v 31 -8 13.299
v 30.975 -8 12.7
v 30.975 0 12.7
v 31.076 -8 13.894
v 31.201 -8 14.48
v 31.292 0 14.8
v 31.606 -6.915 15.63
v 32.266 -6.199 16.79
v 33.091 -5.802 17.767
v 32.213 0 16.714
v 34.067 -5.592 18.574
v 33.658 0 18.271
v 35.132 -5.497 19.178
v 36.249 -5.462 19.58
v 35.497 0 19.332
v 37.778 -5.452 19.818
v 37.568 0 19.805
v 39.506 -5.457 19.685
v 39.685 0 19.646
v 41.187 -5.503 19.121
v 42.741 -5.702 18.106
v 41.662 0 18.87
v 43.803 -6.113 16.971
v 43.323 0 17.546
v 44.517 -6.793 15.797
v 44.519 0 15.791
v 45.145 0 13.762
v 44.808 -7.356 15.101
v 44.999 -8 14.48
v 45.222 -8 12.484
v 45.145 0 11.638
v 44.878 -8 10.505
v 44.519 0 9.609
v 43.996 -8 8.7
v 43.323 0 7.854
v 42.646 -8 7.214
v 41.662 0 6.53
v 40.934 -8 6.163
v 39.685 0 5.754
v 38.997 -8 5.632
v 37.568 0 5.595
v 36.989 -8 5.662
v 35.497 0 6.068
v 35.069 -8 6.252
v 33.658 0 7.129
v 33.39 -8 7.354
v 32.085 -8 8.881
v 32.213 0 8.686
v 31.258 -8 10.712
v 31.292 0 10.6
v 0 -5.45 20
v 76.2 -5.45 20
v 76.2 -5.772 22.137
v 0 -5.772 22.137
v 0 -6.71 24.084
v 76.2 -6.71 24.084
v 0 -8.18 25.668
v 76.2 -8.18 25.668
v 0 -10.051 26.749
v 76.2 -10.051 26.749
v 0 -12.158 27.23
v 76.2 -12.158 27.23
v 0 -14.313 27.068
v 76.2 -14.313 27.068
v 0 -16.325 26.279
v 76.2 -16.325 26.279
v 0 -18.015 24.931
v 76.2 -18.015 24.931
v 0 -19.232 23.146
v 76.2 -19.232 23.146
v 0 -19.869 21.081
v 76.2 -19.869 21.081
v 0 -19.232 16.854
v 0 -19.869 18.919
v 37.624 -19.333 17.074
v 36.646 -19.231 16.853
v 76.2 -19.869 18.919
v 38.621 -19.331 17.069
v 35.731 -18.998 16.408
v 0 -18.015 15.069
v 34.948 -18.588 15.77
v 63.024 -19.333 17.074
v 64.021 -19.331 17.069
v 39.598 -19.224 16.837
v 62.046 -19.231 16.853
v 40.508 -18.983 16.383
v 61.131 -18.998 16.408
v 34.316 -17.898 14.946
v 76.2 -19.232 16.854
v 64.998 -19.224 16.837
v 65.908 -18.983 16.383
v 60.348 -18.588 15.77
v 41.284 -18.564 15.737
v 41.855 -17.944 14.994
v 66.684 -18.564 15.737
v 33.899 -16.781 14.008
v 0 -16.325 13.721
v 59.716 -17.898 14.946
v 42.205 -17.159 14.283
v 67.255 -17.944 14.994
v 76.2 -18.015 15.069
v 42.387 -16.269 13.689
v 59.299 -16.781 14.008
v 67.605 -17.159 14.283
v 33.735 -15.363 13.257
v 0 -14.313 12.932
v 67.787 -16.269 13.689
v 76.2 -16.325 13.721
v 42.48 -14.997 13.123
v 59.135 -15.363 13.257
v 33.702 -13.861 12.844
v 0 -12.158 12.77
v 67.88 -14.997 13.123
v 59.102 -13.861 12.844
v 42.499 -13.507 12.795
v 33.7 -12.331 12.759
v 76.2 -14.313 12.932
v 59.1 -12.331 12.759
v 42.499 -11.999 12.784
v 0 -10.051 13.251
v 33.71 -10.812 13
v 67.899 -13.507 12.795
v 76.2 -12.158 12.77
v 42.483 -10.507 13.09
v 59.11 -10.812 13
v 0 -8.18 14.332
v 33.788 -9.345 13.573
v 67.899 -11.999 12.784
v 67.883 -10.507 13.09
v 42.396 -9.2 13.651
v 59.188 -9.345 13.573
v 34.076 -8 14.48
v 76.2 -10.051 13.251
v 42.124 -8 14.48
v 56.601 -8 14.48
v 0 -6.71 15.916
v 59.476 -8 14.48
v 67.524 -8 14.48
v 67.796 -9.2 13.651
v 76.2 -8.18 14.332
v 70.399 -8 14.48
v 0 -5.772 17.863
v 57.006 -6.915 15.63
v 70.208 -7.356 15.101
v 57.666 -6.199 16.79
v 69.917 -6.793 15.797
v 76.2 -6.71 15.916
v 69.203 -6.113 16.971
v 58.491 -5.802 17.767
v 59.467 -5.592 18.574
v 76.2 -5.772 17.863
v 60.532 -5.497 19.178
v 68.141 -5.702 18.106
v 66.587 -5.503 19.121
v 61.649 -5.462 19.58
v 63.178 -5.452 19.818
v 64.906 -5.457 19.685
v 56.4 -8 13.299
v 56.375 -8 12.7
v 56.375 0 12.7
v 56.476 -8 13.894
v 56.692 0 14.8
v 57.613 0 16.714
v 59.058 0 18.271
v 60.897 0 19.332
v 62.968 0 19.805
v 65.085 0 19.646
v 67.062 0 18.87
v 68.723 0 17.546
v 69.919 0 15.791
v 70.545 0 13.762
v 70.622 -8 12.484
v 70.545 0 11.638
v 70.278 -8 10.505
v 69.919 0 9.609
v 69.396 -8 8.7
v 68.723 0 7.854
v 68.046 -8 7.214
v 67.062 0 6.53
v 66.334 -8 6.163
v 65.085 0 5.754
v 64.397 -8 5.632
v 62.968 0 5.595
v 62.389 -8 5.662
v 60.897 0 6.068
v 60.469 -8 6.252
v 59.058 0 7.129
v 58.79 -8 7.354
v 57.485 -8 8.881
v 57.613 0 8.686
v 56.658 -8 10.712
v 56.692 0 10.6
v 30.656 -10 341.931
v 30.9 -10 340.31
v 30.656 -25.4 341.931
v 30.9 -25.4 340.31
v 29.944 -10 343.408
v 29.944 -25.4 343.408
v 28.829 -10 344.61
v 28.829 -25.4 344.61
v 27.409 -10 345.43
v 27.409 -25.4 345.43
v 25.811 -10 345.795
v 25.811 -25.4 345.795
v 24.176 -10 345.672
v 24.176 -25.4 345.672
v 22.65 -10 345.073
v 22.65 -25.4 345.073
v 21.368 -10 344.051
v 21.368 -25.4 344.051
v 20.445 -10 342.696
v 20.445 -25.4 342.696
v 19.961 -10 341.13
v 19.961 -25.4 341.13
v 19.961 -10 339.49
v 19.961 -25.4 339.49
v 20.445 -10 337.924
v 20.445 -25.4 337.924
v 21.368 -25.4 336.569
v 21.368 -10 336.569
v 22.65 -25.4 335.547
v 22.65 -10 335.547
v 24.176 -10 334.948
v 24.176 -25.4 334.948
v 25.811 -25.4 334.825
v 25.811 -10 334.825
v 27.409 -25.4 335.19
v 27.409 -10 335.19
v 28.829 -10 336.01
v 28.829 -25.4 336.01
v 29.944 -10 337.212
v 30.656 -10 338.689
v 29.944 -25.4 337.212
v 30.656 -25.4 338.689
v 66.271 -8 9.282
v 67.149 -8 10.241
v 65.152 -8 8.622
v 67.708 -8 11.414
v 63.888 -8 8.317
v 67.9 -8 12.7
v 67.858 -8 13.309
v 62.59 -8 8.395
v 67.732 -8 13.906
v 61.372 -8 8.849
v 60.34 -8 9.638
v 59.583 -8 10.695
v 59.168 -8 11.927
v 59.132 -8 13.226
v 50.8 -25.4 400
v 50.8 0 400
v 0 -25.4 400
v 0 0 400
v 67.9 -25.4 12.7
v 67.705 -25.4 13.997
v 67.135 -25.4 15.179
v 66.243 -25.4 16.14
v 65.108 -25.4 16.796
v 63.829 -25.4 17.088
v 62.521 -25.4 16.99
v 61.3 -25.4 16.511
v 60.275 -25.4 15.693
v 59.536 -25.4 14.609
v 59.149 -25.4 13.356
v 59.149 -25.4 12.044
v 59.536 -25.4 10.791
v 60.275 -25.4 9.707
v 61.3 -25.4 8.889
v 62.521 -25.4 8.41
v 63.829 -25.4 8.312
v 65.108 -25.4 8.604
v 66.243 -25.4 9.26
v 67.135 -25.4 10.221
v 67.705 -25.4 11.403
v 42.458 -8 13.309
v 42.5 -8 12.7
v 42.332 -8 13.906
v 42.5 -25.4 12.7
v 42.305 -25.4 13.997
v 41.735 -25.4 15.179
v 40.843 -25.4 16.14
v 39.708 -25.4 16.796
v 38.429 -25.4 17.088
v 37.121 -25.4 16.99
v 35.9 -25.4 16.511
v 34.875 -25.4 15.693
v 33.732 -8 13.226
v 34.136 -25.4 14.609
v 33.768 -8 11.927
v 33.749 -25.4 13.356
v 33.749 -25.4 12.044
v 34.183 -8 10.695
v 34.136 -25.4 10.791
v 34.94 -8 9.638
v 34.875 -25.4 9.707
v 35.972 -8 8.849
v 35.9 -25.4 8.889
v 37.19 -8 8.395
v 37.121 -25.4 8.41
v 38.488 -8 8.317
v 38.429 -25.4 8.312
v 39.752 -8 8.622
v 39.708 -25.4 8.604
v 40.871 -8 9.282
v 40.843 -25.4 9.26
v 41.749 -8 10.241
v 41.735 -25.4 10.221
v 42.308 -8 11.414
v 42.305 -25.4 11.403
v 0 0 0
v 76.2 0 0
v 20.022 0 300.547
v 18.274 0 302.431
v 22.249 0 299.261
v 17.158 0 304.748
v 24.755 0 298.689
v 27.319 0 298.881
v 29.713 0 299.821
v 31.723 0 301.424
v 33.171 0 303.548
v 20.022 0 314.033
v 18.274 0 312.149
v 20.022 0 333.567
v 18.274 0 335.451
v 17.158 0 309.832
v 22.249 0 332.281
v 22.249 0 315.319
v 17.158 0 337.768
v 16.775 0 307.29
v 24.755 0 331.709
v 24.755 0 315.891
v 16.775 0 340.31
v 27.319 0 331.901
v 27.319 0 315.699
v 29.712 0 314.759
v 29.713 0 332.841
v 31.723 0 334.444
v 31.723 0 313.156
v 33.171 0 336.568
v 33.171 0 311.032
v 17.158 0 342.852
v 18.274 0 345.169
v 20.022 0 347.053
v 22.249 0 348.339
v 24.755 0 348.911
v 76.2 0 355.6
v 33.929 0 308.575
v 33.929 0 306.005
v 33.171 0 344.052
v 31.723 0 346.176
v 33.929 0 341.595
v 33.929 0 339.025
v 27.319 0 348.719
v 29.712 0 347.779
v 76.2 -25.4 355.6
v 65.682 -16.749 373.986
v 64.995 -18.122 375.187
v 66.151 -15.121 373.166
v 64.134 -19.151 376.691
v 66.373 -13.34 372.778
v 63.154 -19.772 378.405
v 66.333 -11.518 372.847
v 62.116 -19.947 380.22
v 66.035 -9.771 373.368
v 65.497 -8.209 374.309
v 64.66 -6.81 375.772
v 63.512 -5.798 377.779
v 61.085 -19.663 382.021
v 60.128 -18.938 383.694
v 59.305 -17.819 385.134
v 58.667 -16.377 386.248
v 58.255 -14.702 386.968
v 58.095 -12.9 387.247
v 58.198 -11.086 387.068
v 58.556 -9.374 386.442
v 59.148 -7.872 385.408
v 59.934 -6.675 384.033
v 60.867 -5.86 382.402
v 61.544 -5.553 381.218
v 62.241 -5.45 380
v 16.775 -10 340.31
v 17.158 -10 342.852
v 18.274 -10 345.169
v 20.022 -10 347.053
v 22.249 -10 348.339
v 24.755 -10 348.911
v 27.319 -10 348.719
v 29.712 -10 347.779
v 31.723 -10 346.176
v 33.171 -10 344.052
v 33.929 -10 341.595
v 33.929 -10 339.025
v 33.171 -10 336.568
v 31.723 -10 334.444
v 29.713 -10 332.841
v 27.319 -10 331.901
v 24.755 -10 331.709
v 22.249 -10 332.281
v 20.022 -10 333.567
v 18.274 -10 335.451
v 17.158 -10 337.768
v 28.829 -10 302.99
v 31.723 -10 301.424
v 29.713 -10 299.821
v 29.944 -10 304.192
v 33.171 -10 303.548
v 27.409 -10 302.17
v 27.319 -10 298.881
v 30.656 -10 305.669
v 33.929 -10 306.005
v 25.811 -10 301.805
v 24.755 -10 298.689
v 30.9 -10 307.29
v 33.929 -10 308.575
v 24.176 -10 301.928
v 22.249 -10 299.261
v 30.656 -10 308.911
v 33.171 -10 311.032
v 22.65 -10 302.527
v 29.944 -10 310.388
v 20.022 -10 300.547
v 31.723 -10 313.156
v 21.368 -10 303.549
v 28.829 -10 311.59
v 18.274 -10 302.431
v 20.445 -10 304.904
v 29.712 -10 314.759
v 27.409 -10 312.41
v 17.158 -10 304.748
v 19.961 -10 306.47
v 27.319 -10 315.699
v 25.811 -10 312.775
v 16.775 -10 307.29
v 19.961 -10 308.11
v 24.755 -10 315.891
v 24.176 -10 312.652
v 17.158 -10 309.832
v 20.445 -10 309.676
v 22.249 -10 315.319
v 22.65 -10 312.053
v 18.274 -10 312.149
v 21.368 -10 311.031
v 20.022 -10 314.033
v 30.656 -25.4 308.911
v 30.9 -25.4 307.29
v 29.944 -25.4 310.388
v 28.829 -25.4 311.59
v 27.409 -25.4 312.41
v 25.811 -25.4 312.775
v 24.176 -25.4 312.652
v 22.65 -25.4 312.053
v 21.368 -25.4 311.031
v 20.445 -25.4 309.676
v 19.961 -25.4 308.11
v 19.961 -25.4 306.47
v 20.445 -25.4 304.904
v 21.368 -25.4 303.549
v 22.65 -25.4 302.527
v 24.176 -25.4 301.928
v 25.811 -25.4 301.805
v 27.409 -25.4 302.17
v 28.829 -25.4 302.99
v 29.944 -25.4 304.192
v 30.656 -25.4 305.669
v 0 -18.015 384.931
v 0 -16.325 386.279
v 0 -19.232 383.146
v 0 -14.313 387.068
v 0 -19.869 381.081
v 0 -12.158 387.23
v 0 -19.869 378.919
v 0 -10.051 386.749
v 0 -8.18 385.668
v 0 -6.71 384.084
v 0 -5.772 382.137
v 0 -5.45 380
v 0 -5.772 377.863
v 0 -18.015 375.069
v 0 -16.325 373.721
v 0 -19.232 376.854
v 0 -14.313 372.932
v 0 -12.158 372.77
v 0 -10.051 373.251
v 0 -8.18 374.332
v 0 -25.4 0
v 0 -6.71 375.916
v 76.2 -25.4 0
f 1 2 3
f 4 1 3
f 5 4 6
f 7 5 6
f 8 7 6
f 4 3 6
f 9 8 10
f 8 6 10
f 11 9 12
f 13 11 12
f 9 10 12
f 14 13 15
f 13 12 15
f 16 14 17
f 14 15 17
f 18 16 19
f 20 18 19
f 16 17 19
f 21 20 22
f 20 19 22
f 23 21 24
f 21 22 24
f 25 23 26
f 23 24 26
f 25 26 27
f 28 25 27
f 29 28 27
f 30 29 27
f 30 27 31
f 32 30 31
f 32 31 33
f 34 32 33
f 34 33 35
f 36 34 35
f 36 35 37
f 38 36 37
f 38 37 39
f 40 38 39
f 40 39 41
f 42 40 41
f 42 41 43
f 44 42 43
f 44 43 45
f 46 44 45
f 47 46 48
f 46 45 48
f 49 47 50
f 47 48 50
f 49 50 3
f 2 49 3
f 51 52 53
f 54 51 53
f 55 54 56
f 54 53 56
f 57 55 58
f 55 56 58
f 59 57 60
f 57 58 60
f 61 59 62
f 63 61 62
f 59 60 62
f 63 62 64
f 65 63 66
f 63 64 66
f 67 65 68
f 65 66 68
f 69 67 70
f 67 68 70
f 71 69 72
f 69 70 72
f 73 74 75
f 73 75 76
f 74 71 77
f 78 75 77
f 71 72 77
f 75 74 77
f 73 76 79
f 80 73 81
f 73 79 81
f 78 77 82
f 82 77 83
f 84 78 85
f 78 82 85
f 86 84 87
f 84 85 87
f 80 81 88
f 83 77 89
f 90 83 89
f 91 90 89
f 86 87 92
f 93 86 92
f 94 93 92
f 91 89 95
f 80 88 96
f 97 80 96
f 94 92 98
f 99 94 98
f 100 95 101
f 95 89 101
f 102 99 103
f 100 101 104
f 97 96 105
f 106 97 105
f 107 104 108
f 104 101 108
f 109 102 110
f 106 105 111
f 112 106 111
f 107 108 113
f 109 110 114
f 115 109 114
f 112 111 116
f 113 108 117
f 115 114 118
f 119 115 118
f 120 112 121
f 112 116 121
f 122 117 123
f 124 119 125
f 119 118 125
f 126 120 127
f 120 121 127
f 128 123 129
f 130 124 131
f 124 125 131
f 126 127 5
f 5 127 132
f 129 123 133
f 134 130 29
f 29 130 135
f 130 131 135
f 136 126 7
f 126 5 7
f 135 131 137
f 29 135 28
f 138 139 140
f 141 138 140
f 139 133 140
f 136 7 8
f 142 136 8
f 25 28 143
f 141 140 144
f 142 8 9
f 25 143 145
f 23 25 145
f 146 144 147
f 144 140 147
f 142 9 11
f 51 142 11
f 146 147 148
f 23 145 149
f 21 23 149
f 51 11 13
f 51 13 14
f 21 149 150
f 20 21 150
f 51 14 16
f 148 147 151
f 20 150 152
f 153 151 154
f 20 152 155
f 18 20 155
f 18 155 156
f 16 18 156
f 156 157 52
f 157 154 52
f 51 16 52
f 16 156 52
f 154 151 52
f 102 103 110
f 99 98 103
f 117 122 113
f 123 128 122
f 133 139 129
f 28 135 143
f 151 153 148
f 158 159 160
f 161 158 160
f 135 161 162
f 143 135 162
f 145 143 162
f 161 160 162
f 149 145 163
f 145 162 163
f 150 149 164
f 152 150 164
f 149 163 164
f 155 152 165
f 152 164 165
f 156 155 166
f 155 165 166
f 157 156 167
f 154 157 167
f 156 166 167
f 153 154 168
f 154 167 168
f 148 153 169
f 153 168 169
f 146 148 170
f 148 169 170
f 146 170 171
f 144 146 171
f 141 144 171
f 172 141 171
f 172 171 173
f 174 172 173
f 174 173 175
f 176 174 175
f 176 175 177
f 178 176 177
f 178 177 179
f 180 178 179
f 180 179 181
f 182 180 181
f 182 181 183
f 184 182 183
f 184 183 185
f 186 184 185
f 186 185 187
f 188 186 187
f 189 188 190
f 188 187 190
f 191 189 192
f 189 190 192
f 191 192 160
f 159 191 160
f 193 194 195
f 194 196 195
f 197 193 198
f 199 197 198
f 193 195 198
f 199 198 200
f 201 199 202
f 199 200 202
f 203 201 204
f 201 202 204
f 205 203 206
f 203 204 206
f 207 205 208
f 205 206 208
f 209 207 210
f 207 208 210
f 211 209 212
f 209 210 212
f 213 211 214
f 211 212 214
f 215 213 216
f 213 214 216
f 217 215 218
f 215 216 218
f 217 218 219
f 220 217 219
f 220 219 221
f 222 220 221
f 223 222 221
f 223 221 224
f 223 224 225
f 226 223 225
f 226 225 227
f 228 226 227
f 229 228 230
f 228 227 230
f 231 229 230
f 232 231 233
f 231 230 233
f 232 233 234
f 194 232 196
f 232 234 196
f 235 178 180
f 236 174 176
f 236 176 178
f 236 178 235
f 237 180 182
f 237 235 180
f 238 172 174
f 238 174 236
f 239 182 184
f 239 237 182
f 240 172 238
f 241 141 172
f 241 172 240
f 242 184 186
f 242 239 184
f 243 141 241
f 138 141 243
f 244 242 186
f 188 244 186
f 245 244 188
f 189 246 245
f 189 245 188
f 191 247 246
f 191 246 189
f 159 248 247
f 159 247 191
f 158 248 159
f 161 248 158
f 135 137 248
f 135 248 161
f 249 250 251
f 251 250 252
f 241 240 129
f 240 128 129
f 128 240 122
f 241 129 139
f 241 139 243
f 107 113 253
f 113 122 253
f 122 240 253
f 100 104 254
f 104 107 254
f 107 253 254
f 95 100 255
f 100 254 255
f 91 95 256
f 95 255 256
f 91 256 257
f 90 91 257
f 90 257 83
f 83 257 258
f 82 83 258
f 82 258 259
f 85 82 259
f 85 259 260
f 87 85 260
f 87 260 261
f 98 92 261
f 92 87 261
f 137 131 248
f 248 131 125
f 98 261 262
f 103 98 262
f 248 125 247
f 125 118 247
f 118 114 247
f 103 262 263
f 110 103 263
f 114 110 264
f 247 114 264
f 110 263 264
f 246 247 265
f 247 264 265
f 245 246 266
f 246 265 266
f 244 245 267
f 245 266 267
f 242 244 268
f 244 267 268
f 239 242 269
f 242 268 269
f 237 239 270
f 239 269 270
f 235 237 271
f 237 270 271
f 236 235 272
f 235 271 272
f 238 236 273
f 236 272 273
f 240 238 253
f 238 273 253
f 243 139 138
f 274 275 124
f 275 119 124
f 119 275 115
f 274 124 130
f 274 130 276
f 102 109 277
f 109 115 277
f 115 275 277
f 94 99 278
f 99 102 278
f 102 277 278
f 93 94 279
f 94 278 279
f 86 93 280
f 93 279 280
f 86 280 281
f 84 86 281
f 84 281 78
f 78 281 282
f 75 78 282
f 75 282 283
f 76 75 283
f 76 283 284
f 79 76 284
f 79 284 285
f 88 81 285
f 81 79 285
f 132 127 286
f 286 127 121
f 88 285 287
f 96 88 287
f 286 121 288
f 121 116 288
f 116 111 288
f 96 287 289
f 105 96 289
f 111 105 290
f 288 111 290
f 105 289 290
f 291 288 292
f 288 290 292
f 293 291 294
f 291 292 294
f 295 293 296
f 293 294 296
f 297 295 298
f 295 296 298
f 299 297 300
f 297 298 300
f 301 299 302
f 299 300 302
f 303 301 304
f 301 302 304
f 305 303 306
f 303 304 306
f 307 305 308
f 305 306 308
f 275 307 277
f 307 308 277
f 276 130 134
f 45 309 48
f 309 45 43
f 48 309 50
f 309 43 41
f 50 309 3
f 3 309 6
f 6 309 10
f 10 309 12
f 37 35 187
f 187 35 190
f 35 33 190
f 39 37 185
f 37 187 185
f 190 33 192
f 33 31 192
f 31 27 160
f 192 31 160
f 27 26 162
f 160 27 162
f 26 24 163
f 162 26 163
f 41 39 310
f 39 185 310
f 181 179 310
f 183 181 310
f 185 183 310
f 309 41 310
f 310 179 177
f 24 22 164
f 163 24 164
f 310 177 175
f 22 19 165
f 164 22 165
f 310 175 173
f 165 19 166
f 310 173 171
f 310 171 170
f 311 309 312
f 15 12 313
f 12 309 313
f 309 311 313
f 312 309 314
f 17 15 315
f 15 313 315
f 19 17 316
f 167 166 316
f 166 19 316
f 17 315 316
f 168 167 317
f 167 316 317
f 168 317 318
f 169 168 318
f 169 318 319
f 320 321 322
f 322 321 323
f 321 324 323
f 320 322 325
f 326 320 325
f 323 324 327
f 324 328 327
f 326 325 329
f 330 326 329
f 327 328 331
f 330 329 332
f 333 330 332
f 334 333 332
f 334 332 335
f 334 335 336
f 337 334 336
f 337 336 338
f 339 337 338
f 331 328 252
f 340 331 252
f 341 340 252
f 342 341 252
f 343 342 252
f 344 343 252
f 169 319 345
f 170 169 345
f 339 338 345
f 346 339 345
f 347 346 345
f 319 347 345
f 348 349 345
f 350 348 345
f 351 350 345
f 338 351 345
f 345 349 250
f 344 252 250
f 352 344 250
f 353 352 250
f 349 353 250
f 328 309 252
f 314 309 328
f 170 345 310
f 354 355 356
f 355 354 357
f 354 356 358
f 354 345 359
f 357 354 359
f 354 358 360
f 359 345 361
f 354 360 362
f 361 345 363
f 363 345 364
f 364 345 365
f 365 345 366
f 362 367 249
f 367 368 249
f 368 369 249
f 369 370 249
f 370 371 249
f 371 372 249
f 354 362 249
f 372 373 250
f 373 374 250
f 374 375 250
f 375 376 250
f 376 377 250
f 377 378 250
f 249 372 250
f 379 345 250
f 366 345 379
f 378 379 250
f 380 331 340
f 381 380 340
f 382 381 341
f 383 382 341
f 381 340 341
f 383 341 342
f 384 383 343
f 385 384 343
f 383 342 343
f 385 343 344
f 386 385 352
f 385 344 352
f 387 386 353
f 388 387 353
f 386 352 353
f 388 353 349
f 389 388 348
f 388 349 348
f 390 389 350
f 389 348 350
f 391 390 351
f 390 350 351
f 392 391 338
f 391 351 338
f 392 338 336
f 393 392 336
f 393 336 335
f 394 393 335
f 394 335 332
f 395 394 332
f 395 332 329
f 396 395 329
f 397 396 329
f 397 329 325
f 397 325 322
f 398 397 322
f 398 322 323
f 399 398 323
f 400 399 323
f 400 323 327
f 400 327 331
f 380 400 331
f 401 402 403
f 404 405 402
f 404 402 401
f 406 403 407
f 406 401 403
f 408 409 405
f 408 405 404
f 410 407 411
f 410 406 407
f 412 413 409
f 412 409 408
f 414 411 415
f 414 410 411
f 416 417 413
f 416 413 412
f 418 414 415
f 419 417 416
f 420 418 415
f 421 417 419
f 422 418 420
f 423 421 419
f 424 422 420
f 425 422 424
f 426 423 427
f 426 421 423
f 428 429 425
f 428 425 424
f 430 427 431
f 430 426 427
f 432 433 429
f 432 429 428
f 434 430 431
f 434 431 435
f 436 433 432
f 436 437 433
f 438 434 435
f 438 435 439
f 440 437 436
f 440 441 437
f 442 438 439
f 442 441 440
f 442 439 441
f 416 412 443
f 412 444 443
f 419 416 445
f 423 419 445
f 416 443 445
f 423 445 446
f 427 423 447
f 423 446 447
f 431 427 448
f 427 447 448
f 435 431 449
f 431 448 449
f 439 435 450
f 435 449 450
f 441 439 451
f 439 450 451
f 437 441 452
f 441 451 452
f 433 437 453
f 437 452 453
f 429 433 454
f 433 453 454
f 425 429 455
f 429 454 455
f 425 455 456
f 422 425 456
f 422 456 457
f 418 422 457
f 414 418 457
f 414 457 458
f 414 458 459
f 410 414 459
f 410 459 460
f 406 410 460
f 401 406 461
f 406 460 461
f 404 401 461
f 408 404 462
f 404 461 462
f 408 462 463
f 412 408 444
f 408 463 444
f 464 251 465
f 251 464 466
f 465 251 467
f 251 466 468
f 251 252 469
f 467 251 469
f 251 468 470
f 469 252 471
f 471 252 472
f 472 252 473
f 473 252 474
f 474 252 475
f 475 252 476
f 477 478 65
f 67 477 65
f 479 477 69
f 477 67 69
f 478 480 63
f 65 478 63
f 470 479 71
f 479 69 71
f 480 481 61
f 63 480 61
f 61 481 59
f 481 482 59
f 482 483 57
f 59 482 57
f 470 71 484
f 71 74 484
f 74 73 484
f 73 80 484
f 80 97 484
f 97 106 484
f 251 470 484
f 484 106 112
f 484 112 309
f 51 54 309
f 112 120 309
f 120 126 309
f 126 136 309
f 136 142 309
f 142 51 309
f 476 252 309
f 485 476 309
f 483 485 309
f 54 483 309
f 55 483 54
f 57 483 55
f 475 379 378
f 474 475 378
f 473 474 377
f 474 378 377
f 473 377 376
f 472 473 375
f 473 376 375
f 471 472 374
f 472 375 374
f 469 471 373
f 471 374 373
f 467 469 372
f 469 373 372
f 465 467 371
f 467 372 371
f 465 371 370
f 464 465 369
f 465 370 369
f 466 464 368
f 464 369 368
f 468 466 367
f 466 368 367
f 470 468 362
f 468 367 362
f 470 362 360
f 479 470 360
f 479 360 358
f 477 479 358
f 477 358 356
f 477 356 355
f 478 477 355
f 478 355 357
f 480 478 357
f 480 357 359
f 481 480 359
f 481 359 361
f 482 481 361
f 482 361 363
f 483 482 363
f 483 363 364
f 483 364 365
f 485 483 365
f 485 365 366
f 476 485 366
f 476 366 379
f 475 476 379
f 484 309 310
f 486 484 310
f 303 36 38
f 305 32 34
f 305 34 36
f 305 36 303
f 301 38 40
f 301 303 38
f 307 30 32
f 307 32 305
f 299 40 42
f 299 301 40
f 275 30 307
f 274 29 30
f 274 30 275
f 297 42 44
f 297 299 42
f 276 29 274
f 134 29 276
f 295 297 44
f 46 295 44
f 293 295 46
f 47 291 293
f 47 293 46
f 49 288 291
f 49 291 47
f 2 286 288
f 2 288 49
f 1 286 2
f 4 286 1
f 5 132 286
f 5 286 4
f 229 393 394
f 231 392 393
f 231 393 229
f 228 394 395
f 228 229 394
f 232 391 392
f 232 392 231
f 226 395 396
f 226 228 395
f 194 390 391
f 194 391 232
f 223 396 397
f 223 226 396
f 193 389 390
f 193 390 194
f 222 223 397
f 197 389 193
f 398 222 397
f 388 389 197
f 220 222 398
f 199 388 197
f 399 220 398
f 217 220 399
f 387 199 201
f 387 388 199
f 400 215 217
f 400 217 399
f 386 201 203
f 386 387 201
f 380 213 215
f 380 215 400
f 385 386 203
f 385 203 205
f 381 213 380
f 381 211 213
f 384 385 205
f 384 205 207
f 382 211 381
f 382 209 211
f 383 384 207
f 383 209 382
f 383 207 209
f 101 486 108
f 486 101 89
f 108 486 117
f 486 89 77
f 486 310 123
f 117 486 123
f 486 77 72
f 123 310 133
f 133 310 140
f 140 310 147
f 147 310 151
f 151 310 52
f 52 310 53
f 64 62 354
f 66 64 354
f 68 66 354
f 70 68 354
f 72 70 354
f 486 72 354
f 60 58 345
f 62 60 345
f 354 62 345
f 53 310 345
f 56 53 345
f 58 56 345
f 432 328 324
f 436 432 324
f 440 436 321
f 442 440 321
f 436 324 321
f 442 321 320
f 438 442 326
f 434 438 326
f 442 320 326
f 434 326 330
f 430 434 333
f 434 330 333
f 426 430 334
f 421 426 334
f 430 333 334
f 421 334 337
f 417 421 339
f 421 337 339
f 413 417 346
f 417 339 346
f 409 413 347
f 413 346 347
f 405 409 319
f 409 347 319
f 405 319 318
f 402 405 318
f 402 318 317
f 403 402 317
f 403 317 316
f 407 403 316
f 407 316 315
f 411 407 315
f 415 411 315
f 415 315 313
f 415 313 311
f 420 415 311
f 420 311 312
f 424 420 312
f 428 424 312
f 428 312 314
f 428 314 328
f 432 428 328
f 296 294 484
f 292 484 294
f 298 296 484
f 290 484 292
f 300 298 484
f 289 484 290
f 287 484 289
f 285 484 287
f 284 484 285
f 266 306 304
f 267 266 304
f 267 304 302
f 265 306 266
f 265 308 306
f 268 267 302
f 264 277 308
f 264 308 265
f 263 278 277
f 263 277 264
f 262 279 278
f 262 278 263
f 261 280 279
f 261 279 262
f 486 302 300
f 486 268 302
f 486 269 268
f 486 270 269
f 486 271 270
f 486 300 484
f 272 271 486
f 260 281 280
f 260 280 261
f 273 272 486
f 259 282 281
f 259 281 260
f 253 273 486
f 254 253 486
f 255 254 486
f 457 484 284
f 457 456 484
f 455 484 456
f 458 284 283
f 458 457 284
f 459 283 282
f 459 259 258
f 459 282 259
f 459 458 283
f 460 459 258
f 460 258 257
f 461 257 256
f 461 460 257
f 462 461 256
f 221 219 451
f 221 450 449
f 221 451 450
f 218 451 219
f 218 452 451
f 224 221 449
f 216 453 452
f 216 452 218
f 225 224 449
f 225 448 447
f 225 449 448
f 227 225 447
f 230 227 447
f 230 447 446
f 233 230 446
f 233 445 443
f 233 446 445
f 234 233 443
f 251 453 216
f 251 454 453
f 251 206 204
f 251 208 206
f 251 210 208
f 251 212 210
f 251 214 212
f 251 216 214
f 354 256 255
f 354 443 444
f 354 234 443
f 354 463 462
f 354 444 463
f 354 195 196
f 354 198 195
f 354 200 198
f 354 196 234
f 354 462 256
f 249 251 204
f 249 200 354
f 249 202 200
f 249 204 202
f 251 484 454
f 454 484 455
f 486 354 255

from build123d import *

# Parameters (mm, degrees)
F1_DEPTH       = 25.4
F3_D           = 14.5
F5_D           = 8.8
F5_CBORE_D     = 14.25
F5_CBORE_DEPTH = 8
F7_D           = 11
F7_CBORE_D     = 17.25
F7_CBORE_DEPTH = 10


with BuildPart() as f1:
    # F0 (on Front) → F1 (new body)
    with BuildSketch(Plane.XZ):
        Polygon((0, 400), (0, 0), (76.2, 0), (76.2, 355.6), (50.8, 400), align=None)
    extrude(amount=F1_DEPTH)

    # F3 (through all)
    with Locations(Plane(origin=(0, 0, 0), x_dir=(0, -1, 0), z_dir=(-1, 0, 0))):
        with Locations((12.7, 20), (12.7, 380)):
            Hole(F3_D / 2)

    # F5 (through all)
    with Locations(Plane(origin=(0, 0, 0), x_dir=(-1, 0, 0), z_dir=(0, 1, 0))):
        with Locations((-63.5, 12.7), (-38.1, 12.7)):
            CounterBoreHole(F5_D / 2, F5_CBORE_D / 2, F5_CBORE_DEPTH)

    # F7 (through all)
    with Locations(Plane(origin=(0, 0, 0), x_dir=(-1, 0, 0), z_dir=(0, 1, 0))):
        with Locations((-25.4, 340.31), (-25.4, 307.29)):
            CounterBoreHole(F7_D / 2, F7_CBORE_D / 2, F7_CBORE_DEPTH)


solid = f1.part
